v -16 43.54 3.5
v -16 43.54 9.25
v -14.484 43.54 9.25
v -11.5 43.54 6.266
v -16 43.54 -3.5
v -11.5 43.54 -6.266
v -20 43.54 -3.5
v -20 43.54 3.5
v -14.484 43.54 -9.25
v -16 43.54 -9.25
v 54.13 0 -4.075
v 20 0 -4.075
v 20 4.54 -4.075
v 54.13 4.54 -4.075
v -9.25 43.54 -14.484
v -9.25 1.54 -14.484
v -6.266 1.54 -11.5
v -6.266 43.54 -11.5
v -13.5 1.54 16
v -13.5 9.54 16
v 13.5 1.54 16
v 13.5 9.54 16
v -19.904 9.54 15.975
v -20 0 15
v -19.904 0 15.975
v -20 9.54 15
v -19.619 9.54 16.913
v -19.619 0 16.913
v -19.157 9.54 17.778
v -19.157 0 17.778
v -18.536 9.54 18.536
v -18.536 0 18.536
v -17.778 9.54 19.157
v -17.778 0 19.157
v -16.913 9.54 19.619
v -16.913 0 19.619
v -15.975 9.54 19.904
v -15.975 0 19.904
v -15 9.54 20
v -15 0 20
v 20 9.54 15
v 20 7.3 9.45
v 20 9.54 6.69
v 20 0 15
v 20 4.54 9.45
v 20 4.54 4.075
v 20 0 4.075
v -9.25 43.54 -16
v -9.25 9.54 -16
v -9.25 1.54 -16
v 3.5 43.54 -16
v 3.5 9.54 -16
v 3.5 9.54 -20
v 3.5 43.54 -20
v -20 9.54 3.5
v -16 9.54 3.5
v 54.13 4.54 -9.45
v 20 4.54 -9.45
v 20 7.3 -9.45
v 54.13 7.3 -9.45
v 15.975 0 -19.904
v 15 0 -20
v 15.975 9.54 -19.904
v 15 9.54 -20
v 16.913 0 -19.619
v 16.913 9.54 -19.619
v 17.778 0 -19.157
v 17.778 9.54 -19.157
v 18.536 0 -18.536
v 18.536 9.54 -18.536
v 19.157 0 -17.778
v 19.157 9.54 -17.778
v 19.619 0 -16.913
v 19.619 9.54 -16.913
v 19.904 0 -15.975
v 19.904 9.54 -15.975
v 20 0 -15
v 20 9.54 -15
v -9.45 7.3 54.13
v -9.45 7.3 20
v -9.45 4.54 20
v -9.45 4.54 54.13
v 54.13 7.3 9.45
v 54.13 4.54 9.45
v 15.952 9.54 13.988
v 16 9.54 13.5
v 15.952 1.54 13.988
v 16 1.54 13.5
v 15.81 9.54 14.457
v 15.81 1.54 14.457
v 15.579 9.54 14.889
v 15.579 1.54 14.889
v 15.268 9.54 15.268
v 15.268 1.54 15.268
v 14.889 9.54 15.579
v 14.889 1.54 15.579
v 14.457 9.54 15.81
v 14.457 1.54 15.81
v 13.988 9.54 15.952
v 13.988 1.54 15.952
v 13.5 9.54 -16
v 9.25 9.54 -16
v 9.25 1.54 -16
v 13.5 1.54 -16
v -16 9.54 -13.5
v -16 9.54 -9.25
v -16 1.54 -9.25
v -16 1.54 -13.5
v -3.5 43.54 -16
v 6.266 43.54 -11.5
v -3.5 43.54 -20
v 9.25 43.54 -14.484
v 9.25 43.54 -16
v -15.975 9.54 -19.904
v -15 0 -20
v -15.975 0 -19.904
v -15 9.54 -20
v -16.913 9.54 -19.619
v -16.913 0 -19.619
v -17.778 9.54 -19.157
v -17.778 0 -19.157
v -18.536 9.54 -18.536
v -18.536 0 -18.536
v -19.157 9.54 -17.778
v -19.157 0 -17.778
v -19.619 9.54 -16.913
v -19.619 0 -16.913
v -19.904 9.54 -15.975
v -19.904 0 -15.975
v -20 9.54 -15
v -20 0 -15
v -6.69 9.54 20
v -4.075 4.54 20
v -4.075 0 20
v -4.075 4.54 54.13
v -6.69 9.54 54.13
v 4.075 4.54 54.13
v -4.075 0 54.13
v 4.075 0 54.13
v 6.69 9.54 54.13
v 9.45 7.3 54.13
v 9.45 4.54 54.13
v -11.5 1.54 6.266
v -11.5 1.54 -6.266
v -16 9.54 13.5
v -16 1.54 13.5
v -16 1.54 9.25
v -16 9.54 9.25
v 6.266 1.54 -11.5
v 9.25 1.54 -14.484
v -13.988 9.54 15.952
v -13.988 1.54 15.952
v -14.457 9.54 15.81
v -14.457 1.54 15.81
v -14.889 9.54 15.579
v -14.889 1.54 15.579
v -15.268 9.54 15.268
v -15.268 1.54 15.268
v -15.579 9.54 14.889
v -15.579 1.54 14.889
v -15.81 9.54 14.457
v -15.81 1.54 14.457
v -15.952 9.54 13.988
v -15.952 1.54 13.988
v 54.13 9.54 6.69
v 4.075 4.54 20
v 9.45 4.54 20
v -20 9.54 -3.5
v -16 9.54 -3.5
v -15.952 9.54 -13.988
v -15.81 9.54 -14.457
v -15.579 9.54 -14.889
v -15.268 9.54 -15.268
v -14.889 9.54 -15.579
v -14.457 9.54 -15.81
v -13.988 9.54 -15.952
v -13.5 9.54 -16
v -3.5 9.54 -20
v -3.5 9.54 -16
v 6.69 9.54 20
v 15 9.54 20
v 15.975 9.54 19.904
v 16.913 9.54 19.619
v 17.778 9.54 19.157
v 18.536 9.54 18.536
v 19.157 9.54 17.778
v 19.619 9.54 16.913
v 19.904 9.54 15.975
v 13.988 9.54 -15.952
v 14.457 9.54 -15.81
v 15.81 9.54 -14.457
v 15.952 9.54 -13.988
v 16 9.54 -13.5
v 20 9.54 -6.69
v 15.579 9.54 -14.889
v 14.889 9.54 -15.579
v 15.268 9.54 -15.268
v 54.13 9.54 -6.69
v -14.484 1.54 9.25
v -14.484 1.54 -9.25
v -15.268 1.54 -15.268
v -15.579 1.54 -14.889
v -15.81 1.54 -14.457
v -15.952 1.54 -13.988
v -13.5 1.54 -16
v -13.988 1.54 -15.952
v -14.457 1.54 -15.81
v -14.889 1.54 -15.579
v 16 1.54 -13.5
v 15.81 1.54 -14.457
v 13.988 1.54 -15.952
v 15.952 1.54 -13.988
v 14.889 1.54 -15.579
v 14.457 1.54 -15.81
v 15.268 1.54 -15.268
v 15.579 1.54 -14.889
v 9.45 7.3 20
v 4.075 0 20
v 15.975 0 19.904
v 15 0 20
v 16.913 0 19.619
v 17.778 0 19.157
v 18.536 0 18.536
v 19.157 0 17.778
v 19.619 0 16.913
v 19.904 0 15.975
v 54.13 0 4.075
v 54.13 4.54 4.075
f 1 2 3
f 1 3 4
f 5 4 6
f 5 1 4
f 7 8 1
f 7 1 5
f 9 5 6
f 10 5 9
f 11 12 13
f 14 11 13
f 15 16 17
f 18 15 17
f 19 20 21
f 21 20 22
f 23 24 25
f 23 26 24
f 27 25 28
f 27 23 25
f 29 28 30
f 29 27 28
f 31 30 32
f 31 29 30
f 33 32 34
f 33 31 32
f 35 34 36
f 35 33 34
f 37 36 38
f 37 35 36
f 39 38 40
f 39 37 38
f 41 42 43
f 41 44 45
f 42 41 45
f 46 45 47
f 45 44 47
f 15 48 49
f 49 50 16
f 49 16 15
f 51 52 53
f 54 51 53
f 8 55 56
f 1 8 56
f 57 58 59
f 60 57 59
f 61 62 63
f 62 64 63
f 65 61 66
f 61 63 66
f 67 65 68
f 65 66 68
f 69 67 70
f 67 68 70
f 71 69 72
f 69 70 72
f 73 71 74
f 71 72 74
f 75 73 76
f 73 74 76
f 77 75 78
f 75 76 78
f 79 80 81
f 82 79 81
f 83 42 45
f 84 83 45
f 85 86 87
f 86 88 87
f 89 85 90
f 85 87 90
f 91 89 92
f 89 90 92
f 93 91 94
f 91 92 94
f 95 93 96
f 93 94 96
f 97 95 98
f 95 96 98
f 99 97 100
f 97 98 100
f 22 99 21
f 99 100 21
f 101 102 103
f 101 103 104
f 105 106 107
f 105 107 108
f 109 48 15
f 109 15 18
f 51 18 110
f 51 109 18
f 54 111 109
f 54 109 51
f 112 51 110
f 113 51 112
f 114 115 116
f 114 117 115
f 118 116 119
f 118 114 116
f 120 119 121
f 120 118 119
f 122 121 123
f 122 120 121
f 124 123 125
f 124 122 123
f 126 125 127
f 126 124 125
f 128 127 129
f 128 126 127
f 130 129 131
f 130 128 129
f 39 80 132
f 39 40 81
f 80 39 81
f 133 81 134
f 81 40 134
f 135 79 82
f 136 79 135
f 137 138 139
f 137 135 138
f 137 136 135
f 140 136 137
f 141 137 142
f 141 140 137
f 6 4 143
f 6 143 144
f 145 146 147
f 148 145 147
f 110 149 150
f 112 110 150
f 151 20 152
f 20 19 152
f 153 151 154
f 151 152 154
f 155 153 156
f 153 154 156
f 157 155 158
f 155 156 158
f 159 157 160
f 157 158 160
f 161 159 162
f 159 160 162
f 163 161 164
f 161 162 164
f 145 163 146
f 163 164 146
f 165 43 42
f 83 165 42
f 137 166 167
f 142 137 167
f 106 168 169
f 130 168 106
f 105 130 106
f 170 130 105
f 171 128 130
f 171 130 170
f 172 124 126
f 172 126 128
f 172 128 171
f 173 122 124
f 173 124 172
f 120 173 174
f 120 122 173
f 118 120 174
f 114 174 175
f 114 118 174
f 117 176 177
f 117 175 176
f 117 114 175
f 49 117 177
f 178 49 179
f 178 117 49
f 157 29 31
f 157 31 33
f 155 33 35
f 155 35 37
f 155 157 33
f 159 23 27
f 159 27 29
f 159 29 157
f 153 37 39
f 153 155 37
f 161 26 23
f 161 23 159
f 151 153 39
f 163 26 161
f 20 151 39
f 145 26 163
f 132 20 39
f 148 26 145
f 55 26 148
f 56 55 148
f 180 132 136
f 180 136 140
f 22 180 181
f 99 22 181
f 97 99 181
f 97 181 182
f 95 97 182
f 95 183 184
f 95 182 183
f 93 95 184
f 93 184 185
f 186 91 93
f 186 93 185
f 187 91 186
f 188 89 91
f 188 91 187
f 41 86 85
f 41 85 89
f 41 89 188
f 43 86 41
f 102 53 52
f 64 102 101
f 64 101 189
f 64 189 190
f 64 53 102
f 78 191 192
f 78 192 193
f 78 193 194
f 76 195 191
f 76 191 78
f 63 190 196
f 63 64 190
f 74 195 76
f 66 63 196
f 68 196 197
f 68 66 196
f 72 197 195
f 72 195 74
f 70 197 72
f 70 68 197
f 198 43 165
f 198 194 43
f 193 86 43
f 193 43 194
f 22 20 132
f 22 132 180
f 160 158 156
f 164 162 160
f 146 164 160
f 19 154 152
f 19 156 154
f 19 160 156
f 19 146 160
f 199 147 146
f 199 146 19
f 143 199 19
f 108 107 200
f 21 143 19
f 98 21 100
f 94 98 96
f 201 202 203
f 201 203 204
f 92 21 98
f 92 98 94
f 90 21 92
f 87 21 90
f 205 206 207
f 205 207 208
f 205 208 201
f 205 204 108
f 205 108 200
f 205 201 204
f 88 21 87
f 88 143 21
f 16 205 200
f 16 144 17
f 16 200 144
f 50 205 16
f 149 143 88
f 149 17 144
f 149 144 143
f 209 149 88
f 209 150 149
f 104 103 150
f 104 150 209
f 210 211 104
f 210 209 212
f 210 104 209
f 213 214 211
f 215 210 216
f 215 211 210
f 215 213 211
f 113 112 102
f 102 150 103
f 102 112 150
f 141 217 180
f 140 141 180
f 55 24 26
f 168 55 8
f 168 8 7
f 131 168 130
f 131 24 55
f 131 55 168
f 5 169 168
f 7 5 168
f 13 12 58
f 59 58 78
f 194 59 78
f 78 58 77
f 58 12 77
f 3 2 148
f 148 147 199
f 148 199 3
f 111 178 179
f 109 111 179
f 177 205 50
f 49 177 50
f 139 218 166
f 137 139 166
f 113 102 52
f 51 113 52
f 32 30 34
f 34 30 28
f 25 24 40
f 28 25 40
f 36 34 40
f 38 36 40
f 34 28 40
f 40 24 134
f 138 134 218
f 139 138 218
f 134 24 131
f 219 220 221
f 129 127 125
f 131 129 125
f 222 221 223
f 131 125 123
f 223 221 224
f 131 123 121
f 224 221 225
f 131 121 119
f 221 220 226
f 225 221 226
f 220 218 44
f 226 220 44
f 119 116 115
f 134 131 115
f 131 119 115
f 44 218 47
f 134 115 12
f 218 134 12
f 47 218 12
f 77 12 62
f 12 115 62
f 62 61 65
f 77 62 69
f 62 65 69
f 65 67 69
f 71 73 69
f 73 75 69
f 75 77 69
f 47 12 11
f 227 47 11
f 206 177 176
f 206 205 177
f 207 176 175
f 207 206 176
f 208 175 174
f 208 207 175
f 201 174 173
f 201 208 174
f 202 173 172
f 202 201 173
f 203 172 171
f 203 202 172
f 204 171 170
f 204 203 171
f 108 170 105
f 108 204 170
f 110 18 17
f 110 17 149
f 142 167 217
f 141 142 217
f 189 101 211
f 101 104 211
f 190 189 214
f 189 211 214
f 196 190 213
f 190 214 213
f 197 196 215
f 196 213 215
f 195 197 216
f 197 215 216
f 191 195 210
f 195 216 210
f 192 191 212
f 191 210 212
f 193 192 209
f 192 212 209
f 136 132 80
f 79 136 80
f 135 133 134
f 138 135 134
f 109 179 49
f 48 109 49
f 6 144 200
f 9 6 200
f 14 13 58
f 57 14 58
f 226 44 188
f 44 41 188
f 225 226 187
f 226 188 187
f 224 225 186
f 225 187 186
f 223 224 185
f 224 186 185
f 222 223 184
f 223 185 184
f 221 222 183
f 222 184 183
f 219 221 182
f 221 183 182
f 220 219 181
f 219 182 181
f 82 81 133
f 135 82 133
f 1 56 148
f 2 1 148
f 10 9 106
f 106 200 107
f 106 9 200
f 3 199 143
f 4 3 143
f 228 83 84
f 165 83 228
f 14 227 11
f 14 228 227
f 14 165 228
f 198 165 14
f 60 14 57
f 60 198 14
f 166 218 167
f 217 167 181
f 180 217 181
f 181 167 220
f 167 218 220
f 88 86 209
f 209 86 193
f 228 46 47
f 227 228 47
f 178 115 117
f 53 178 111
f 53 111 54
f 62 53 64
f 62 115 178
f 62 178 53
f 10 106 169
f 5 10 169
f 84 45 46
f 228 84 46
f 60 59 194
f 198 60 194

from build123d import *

# Parameters (mm, degrees)
SKETCH1_W           = 40
SKETCH1_H           = 40
BOSS_EXTRUDE2_DEPTH = 9.54
SKETCH2_W           = 32
SKETCH2_H           = 32
CUT_EXTRUDE1_DEPTH  = 8
BOSS_EXTRUDE3_DEPTH = 42
CIRPATTERN1_COUNT   = 2
CIRPATTERN1_ANGLE   = 90
BOSS_EXTRUDE4_DEPTH = 34.13
CIRPATTERN2_COUNT   = 2
CIRPATTERN2_ANGLE   = 90
FILLET1_R           = 2.5
FILLET2_R           = 5


with BuildPart() as part:
    # Sketch1 → Boss-Extrude2 (new body)
    with BuildSketch(Plane(origin=(0, 0, 0), x_dir=(1, 0, 0), z_dir=(0, 1, 0))):
        Rectangle(SKETCH1_W, SKETCH1_H)
    extrude(amount=BOSS_EXTRUDE2_DEPTH)

    # Sketch2 → Cut-Extrude1 (cut)
    with BuildSketch(Plane(origin=(0, 9.54, 0), x_dir=(1, 0, 0), z_dir=(0, 1, 0))):
        Rectangle(SKETCH2_W, SKETCH2_H)
    extrude(amount=-CUT_EXTRUDE1_DEPTH, mode=Mode.SUBTRACT)

    # Sketch3 → Boss-Extrude3 (add)
    with BuildSketch(Plane(origin=(0, 1.54, 0), x_dir=(1, 0, 0), z_dir=(0, 1, 0))):
        Polygon((3.5, 20), (-3.5, 20), (-3.5, 16), (-9.25, 16), (-9.25, 14.4844), (-6.2656, 11.5), (6.2656, 11.5), (9.25, 14.4844), (9.25, 16), (3.5, 16), align=None)
    boss_extrude3 = extrude(amount=BOSS_EXTRUDE3_DEPTH)

    # CirPattern1: Boss-Extrude3 ×2 about axis
    cirpattern1_axis = Axis((0, 0, 0), (0, 1, 0))
    for i in range(1, CIRPATTERN1_COUNT):
        add(boss_extrude3.rotate(cirpattern1_axis, i * CIRPATTERN1_ANGLE / (CIRPATTERN1_COUNT - 1)))

    # Sketch4 → Boss-Extrude4 (add)
    with BuildSketch(Plane.XY.offset(20)):
        Polygon((-4.075, 0), (4.075, 0), (4.075, 4.54), (9.45, 4.54), (9.45, 7.3), (6.689745603, 9.54), (-6.689745603, 9.54), (-9.45, 7.3), (-9.45, 4.54), (-4.075, 4.54), align=None)
    boss_extrude4 = extrude(amount=BOSS_EXTRUDE4_DEPTH)

    # CirPattern2: Boss-Extrude4 ×2 about axis
    cirpattern2_axis = Axis((0, 0, 0), (0, 1, 0))
    for i in range(1, CIRPATTERN2_COUNT):
        add(boss_extrude4.rotate(cirpattern2_axis, i * CIRPATTERN2_ANGLE / (CIRPATTERN2_COUNT - 1)))

    # Fillet1
    fillet1_edges = [part.edges().sort_by_distance(p)[0] for p in [
        (16, 5.54, -16),
        (16, 5.54, 16),
        (-16, 5.54, 16),
        (-16, 5.54, -16),
    ]]
    fillet(fillet1_edges, radius=FILLET1_R)

    # Fillet2
    fillet2_edges = [part.edges().sort_by_distance(p)[0] for p in [
        (20, 4.77, 20),
        (-20, 4.77, 20),
        (-20, 4.77, -20),
        (20, 4.77, -20),
    ]]
    fillet(fillet2_edges, radius=FILLET2_R)


solid = part.part
